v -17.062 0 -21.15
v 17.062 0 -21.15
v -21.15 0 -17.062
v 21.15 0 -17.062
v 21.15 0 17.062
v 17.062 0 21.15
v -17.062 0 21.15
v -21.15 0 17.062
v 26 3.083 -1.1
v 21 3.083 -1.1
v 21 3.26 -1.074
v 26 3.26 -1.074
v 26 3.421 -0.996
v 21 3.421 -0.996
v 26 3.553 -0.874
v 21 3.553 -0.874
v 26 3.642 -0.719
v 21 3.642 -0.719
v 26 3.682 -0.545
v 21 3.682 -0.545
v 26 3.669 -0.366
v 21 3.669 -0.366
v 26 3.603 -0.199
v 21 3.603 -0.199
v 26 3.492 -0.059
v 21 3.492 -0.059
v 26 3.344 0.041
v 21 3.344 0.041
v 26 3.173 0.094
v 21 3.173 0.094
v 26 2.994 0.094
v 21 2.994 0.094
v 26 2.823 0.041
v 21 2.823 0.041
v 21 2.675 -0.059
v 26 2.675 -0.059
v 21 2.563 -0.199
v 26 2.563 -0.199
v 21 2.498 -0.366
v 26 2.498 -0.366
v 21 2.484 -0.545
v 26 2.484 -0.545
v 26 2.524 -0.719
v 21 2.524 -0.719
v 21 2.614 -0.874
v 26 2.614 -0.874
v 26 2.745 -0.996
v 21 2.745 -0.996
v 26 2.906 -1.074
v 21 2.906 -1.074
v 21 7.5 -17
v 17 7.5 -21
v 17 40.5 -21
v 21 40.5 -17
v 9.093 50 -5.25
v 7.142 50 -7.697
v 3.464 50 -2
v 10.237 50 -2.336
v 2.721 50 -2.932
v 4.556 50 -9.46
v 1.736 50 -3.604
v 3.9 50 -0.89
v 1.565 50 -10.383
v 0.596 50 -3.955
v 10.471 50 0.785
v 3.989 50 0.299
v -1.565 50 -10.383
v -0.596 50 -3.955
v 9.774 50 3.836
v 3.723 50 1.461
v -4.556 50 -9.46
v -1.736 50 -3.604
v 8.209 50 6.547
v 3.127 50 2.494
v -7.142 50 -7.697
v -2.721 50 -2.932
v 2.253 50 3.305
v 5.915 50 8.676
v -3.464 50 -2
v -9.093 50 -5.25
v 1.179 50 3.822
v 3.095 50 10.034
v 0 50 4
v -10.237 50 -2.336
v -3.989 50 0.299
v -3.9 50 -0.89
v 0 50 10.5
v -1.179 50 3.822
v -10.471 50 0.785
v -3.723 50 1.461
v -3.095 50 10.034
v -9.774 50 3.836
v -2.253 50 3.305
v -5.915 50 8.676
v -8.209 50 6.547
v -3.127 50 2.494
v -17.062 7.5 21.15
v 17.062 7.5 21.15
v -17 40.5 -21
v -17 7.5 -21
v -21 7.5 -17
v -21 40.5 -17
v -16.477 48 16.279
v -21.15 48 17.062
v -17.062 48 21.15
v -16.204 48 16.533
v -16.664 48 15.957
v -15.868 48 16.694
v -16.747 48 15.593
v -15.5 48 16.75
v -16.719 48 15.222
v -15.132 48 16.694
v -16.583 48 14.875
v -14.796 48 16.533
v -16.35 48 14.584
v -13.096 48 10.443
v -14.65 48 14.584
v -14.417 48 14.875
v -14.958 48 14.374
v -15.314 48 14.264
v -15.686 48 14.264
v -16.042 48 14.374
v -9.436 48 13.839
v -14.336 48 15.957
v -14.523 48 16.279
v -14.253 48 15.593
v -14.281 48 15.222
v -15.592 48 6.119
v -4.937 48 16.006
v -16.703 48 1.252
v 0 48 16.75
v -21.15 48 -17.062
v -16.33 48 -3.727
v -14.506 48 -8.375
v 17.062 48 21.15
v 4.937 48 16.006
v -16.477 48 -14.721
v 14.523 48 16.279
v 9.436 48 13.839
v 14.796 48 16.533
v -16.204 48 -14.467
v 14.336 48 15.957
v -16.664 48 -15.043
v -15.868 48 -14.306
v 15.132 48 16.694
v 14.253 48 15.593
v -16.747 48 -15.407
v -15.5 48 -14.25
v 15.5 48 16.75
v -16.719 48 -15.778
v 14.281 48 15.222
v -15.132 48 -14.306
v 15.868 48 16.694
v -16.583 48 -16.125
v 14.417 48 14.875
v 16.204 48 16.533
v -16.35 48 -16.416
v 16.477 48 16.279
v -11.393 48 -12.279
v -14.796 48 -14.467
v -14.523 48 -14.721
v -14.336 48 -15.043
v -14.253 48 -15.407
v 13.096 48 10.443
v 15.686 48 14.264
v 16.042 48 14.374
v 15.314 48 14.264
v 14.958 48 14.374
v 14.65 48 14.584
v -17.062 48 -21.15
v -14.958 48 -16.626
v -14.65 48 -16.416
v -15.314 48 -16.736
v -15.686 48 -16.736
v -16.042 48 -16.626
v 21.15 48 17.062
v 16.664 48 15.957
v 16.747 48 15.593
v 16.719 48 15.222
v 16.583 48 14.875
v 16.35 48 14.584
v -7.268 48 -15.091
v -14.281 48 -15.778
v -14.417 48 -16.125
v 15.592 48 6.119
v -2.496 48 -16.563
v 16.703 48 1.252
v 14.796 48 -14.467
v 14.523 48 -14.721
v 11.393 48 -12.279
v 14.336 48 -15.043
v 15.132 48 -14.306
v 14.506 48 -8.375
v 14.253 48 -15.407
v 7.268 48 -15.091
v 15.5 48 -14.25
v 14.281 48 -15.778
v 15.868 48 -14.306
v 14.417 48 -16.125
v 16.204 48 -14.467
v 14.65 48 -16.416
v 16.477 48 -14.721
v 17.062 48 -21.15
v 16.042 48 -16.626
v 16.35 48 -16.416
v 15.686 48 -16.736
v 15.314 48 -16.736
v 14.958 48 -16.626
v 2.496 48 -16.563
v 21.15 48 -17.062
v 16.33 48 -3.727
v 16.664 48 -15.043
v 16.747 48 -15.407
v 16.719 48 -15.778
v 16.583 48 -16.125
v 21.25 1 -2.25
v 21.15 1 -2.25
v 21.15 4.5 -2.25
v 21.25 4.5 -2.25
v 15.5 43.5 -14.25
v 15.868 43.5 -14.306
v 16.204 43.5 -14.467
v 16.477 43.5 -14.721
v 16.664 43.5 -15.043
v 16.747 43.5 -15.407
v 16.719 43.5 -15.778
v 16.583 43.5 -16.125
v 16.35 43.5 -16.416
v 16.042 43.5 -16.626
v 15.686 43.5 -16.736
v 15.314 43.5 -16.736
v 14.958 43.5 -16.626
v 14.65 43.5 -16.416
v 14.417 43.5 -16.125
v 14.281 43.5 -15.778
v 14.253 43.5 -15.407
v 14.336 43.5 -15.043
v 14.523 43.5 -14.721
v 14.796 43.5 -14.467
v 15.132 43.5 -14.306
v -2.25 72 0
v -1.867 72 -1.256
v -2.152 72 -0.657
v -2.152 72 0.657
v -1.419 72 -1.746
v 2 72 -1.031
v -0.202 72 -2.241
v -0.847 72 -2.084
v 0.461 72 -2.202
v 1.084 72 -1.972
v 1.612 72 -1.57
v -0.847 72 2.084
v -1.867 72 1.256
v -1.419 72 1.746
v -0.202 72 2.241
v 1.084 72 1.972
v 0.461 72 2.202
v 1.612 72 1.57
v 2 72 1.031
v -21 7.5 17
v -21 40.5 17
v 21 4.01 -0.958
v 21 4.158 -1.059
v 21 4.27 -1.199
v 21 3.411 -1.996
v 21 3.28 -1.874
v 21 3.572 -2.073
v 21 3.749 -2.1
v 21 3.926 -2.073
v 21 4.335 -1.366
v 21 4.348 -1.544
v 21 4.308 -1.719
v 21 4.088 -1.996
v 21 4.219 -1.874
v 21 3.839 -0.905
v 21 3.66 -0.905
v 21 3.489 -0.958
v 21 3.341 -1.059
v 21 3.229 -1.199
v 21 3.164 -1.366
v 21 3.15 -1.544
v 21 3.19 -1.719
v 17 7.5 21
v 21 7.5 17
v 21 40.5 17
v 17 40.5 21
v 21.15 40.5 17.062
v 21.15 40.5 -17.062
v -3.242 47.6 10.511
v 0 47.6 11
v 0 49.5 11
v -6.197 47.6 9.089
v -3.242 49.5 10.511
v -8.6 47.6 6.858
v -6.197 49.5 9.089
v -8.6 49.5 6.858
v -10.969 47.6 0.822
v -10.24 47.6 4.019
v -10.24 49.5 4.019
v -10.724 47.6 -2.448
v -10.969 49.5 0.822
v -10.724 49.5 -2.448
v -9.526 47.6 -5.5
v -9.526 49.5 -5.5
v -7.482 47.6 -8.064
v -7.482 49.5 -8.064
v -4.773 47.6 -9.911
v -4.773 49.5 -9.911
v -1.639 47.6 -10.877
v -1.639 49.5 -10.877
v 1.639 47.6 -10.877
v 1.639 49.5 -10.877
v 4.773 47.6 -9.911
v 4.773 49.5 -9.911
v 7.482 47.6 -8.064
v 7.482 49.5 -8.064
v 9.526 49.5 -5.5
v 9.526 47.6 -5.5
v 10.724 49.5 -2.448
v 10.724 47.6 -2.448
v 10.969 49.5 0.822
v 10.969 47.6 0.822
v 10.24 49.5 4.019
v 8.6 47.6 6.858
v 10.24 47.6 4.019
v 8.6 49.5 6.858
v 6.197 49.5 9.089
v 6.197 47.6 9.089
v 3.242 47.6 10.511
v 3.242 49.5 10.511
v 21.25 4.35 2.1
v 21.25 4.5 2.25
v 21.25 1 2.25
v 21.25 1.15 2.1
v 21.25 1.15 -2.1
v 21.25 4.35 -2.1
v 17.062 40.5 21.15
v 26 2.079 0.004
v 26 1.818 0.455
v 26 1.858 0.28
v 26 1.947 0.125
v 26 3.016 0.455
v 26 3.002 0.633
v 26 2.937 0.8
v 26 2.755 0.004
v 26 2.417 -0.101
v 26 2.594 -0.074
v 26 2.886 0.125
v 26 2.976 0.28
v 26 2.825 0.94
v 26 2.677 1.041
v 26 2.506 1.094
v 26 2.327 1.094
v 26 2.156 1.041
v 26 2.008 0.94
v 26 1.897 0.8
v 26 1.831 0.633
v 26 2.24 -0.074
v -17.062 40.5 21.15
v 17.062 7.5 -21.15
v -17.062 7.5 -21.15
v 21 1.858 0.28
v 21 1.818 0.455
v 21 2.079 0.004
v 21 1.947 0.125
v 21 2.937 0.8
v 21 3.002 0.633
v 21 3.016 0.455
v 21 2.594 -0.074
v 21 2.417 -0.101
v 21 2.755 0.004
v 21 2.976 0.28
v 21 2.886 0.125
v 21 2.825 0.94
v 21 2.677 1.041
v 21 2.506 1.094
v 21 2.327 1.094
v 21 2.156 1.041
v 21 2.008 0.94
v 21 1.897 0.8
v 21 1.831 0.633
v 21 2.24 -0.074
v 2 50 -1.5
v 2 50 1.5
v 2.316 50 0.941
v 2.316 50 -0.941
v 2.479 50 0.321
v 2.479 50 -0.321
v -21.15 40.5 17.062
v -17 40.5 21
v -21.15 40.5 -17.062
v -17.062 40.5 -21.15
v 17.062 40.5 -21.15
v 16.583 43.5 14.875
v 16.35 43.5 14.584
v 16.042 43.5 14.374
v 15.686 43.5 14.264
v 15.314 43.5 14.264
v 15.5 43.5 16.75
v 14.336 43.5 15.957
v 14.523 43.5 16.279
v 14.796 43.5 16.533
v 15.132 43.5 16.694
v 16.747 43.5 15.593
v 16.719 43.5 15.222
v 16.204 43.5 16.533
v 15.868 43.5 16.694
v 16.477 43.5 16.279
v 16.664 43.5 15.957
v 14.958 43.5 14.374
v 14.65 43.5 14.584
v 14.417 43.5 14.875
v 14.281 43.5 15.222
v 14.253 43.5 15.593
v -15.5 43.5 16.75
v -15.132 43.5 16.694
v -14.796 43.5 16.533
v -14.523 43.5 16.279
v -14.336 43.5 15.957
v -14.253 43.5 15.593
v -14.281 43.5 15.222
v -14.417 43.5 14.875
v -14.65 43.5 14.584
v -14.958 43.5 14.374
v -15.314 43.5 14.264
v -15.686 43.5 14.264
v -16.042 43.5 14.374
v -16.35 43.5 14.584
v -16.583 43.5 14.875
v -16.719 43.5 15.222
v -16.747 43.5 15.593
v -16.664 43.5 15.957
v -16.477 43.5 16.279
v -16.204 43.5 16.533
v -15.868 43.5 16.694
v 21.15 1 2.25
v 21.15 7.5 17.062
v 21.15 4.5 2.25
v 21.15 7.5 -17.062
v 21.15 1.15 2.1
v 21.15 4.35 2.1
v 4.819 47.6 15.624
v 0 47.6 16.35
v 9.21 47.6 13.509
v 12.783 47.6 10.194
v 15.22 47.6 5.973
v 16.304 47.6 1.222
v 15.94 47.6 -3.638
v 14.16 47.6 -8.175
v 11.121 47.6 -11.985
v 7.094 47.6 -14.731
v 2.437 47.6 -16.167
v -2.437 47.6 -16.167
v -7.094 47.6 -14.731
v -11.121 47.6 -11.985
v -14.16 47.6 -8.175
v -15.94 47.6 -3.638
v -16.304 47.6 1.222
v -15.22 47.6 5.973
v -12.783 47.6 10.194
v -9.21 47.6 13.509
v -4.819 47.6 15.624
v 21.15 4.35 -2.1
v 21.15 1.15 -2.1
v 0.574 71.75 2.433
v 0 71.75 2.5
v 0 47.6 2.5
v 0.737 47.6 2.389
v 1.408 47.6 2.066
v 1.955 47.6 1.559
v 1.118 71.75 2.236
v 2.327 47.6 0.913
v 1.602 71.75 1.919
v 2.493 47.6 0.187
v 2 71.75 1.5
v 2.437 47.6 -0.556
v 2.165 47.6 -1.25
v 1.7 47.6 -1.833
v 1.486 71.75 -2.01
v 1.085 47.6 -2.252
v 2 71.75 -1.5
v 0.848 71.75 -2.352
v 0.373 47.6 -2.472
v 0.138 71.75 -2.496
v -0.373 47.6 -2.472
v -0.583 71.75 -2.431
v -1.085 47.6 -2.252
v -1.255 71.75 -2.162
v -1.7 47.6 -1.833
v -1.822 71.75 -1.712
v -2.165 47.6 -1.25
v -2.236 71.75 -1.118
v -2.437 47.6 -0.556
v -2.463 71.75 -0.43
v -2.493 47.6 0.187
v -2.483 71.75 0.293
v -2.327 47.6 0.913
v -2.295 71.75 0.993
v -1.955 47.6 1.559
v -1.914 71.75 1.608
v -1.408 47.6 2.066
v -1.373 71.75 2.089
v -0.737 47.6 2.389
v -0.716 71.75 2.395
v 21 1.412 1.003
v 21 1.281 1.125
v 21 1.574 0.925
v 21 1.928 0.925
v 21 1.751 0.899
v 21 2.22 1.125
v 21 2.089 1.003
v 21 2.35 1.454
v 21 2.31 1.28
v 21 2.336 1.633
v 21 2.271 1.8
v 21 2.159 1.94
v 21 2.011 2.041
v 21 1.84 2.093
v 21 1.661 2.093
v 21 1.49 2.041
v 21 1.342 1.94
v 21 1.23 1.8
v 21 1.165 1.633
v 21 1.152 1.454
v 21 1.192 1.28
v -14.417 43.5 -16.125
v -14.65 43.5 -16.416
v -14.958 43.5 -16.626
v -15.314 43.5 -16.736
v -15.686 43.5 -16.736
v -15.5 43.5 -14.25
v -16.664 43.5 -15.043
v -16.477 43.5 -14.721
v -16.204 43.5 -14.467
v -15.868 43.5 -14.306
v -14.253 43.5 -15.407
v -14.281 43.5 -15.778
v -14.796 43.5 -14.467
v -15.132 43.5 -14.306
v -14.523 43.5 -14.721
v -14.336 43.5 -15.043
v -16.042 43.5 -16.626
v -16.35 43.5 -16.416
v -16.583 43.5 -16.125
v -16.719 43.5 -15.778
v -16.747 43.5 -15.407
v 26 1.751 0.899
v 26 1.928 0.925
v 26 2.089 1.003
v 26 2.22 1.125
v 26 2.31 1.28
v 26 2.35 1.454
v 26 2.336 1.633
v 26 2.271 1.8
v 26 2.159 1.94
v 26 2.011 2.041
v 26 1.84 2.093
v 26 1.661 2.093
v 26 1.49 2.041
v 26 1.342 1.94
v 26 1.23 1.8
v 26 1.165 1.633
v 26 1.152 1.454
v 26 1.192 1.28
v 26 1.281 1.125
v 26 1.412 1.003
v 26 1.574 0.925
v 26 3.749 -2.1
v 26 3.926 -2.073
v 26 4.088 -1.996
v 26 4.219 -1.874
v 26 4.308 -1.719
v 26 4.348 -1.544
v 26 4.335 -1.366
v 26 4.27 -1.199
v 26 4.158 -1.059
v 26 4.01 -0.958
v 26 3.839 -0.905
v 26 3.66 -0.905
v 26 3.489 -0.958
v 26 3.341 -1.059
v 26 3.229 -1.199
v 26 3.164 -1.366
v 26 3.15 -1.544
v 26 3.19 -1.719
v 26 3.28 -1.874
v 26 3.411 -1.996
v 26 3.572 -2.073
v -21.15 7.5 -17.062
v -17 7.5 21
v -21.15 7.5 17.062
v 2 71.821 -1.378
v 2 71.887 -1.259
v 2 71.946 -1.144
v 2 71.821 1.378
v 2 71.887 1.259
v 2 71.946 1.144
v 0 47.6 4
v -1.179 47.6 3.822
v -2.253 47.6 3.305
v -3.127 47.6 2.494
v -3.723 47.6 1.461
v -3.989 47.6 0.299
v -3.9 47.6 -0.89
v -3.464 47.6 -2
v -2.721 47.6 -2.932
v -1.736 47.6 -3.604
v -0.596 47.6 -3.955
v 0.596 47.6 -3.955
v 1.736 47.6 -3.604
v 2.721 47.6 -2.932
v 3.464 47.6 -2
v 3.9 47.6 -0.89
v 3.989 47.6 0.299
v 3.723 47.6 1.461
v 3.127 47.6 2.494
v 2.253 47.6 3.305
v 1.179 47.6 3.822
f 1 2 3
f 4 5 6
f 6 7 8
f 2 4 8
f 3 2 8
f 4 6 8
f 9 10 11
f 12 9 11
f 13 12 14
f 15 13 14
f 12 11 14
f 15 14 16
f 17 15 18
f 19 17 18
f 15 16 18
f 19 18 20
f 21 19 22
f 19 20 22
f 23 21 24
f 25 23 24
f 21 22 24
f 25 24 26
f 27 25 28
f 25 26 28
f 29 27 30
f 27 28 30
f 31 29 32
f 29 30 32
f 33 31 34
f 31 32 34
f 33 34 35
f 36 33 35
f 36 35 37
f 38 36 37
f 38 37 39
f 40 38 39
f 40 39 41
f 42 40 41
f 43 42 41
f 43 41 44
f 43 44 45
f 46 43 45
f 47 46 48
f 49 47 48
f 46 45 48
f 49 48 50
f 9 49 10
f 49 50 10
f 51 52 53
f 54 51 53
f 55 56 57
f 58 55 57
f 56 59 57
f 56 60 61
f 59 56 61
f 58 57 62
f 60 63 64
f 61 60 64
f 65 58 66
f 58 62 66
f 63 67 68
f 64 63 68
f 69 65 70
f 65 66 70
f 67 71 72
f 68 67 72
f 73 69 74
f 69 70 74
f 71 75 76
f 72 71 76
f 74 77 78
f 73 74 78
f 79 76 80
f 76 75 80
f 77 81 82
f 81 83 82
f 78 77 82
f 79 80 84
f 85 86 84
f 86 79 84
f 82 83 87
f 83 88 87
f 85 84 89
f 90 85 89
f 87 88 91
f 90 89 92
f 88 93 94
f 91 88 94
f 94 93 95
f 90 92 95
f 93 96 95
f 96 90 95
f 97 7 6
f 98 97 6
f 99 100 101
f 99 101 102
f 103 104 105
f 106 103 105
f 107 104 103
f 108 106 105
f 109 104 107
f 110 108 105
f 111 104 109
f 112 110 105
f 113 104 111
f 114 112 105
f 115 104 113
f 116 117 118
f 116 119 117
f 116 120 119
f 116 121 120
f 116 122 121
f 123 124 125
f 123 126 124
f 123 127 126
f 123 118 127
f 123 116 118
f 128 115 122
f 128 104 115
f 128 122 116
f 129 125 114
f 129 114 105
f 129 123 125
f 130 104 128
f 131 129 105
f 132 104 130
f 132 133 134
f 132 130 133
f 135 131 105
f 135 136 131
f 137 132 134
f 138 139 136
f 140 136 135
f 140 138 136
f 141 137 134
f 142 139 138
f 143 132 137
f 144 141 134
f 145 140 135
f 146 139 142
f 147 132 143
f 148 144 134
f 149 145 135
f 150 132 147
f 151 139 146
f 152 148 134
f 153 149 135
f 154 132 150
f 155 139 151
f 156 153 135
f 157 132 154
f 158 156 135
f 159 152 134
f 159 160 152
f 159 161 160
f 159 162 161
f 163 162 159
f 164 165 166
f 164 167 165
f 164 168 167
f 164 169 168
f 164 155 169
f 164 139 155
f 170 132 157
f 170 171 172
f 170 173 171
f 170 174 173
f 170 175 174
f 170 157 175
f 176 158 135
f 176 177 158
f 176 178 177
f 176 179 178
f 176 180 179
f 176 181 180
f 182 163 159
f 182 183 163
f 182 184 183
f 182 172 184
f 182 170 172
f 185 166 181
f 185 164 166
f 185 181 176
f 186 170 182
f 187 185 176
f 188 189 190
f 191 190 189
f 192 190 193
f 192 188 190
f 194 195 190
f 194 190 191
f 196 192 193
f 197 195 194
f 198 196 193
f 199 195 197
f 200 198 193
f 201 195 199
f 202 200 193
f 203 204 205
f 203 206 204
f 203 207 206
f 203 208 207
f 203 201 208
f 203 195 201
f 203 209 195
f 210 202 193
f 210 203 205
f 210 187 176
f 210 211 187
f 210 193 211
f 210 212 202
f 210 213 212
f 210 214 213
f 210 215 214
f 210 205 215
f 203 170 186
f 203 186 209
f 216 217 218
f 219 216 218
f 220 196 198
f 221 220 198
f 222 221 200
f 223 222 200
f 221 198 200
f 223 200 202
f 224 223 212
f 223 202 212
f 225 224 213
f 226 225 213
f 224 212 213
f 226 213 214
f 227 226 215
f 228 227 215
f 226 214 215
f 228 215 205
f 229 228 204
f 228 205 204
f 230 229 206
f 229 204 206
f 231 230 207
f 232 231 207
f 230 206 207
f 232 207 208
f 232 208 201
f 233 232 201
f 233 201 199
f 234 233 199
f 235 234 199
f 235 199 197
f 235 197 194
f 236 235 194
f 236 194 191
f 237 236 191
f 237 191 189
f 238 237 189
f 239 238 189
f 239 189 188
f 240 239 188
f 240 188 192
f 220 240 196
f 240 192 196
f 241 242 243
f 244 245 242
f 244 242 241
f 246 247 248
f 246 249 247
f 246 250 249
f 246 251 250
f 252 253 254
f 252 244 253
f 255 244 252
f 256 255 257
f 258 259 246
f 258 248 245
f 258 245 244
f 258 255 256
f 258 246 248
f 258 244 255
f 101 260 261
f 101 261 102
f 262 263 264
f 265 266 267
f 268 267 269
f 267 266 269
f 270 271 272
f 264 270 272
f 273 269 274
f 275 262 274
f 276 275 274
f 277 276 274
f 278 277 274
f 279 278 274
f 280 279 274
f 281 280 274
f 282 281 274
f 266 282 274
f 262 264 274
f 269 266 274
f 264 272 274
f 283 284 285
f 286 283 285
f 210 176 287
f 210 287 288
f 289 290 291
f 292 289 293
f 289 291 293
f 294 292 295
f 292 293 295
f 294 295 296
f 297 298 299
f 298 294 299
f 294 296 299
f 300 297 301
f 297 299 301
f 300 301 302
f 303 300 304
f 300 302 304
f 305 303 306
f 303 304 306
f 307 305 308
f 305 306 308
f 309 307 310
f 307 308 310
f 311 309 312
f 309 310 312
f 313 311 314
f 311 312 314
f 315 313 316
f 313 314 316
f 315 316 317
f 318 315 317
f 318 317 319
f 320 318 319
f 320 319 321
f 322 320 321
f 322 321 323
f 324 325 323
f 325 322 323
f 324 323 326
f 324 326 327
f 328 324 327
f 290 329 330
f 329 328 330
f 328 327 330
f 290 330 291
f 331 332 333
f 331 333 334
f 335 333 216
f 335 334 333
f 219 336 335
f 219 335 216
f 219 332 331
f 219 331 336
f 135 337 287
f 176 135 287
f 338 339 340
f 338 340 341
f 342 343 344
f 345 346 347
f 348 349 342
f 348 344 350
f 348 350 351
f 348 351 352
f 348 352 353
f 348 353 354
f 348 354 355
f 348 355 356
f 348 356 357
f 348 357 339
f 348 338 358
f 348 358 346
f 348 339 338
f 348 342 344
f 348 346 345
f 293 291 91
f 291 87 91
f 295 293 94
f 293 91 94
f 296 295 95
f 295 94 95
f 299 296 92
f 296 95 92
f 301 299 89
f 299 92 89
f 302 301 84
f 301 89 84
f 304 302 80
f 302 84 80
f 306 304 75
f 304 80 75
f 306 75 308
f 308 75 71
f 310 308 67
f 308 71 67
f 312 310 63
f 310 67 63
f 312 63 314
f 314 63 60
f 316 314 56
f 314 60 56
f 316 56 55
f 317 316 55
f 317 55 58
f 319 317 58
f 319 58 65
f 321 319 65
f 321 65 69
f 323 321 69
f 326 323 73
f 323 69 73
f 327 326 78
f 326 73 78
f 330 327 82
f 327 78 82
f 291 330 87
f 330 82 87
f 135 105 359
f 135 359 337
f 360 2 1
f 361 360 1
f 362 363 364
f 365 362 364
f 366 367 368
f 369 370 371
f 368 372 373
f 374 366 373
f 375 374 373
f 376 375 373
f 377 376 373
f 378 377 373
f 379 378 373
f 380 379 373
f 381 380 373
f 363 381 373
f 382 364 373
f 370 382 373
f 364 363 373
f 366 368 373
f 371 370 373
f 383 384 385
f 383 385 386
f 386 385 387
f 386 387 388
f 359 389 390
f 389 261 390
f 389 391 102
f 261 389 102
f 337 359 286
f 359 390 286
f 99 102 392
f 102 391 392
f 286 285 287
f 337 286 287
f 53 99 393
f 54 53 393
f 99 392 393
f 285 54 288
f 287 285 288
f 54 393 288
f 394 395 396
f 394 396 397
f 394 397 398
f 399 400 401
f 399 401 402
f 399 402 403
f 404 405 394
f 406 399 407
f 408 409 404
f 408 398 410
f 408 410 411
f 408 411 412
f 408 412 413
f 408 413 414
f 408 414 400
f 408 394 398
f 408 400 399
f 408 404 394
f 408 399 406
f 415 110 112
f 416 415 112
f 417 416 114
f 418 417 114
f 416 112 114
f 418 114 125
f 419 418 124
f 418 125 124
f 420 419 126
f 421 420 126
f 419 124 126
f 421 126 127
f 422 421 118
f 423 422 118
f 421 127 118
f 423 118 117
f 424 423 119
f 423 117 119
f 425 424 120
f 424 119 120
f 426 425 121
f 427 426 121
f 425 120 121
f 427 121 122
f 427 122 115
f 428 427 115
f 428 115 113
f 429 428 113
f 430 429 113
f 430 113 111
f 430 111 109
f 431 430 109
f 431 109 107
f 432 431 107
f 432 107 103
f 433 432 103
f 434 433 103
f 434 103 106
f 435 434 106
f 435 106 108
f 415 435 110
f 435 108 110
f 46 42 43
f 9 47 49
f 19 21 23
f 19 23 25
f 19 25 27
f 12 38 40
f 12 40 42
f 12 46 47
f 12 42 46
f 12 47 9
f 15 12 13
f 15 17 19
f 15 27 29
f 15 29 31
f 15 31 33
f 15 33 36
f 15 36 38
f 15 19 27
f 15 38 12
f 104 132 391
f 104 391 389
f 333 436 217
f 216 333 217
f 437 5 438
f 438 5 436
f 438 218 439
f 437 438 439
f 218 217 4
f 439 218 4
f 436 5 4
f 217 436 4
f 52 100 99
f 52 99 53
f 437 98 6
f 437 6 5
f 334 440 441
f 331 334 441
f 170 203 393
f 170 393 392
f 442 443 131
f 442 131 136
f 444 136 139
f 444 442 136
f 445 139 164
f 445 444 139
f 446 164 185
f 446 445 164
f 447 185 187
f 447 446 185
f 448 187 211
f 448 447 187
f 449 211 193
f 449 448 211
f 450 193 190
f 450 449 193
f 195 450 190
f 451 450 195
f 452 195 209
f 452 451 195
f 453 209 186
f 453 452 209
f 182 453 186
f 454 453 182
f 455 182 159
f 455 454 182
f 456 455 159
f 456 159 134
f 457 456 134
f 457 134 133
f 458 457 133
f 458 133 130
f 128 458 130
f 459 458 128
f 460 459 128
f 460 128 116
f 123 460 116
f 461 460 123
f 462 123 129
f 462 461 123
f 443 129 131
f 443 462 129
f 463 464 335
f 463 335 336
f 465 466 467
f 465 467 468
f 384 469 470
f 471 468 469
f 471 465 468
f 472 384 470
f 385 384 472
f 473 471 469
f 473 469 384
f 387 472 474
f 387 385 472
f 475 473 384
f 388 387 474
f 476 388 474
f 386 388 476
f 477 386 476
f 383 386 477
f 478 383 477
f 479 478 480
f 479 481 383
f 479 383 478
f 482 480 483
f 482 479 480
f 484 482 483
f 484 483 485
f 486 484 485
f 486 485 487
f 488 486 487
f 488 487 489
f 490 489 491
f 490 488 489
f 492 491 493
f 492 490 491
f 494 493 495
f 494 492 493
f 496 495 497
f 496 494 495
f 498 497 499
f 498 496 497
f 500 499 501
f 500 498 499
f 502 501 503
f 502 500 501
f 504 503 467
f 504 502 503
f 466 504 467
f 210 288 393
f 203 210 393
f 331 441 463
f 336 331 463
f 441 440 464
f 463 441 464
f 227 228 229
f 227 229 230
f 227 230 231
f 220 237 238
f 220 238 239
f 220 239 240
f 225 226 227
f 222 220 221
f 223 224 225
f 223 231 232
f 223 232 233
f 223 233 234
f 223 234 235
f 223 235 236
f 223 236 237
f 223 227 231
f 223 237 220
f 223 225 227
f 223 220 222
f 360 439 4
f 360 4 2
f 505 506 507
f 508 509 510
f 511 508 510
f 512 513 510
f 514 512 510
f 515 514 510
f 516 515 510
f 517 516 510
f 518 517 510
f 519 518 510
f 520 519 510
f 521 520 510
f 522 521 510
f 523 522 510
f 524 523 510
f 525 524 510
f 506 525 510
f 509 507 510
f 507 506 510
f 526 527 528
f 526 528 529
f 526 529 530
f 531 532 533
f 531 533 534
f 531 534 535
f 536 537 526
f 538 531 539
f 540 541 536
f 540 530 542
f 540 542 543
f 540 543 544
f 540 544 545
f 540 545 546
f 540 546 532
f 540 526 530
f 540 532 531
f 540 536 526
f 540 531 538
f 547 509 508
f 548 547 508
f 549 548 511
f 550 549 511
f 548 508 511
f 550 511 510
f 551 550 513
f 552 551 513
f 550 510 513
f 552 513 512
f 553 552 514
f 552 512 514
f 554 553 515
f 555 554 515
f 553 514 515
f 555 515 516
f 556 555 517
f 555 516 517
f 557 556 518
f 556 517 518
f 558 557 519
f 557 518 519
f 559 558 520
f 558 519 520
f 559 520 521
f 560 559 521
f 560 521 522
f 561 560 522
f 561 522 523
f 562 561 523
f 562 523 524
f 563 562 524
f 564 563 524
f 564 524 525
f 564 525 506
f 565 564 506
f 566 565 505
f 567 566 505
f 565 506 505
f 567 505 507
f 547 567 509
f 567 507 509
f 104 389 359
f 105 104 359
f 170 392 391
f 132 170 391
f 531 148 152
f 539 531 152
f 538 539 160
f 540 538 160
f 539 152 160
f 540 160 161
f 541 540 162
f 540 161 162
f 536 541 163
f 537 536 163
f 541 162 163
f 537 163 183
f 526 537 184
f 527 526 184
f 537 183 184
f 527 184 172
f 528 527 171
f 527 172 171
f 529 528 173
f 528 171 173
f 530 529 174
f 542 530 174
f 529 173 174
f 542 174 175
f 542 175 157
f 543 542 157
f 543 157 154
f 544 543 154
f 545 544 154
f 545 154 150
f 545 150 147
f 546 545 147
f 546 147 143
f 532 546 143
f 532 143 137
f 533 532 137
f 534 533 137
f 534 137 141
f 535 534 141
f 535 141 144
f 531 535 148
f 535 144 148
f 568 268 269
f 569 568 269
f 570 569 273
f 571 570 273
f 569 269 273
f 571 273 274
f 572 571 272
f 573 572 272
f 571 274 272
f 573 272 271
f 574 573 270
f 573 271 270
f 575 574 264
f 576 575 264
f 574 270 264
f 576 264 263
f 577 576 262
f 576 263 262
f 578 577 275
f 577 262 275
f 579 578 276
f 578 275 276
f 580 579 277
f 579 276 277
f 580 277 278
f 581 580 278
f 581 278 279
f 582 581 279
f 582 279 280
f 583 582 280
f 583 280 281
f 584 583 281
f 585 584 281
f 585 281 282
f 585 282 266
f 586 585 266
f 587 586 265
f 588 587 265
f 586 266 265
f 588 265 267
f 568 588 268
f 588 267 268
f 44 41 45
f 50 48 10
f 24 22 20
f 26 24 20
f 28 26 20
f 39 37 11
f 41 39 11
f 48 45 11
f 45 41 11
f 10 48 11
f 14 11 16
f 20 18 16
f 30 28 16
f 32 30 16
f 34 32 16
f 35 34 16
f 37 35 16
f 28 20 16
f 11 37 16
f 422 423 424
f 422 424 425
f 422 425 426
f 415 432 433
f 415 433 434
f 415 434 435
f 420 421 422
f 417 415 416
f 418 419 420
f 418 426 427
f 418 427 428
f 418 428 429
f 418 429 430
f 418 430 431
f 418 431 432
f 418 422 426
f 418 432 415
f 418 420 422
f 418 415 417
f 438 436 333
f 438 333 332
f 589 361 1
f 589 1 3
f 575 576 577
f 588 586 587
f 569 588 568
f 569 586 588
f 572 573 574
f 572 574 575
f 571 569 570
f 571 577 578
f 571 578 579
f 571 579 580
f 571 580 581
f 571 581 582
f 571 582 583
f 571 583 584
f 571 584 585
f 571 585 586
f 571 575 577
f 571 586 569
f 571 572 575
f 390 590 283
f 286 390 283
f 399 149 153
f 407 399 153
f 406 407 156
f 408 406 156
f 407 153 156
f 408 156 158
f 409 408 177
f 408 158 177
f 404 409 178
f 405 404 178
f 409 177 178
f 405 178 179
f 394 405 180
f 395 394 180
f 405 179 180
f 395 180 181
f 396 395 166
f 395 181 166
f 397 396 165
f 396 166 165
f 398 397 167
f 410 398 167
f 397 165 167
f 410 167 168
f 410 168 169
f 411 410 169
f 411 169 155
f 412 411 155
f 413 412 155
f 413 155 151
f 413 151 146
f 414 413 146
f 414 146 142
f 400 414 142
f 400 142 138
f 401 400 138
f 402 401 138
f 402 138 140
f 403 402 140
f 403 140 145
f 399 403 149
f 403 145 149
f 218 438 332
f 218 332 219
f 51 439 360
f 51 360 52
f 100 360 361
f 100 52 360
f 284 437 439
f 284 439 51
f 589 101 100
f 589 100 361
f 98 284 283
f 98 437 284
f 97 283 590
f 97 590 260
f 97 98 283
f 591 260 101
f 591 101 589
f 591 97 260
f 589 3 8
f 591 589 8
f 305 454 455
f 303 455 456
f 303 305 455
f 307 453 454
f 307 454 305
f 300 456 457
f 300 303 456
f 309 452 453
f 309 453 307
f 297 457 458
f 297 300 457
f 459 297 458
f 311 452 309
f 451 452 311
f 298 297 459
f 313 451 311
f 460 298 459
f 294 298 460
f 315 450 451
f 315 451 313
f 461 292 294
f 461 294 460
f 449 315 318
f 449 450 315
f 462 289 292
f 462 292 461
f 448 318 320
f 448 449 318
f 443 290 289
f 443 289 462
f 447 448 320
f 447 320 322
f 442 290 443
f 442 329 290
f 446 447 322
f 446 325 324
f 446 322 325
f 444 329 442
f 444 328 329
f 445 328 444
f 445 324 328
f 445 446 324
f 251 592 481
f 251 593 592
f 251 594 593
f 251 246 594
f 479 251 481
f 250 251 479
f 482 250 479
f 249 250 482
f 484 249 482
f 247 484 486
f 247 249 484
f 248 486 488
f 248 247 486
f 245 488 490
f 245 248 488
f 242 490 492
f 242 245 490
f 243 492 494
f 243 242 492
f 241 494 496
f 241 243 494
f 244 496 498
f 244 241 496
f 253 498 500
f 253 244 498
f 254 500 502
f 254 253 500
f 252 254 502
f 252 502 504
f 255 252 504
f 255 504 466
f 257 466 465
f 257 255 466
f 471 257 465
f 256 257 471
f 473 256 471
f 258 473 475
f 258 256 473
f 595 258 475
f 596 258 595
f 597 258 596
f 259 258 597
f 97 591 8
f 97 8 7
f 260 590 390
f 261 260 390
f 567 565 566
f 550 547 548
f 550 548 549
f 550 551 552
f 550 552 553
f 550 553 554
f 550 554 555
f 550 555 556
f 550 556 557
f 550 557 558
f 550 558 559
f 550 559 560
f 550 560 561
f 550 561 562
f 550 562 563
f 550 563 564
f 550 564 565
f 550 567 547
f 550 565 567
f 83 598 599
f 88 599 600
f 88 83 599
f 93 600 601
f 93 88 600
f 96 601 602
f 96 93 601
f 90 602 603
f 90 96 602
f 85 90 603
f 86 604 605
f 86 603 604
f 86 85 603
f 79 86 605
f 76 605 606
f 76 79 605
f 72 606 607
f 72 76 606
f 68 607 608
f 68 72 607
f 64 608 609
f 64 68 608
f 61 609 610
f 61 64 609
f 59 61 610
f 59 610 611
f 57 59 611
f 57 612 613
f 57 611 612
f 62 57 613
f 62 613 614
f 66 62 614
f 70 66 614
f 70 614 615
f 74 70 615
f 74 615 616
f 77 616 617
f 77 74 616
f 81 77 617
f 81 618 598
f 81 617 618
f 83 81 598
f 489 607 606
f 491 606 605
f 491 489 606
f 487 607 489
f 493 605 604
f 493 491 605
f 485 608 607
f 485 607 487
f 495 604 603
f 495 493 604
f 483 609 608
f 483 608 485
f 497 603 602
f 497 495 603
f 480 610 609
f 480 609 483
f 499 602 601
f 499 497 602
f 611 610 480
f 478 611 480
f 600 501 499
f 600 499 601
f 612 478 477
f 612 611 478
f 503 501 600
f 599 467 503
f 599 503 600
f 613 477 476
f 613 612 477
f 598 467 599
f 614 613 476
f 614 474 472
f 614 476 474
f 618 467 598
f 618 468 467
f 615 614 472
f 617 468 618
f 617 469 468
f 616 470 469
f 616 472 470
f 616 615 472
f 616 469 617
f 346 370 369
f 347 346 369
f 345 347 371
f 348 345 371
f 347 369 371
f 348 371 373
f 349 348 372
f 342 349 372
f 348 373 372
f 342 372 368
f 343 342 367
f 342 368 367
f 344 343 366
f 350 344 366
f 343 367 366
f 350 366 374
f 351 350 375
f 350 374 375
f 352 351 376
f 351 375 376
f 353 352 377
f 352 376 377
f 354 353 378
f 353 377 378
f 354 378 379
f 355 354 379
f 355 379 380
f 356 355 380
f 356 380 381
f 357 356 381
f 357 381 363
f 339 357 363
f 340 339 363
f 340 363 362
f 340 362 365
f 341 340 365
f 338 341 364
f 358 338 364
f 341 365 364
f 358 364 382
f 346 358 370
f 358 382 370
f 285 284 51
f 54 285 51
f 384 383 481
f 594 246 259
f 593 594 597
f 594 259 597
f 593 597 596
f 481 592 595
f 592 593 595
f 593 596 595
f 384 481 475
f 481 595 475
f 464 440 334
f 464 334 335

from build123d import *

# Parameters (mm, degrees)
CROQUIS1_W                          = 42
CROQUIS1_H                          = 42
SALIENTE_EXTRUIR1_DEPTH             = 48
CHAFL_N1_SIZE                       = 4
CROQUIS3_R                          = 16.25
CORTAR_EXTRUIR1_DEPTH               = 0.4
SALIENTE_EXTRUIR2_REACH             = 60.155
CROQUIS4_R                          = 11
CROQUIS4_R_2                        = 4
CHAFL_N2_SIZE                       = 0.5
CROQUIS5_R                          = 2.5
SALIENTE_EXTRUIR3_DEPTH             = 22
SALIENTE_EXTRUIR3_DIRECTION_2_REACH = 60.155
CORTAR_EXTRUIR2_DEPTH               = 22
CHAFL_N3_SIZE                       = 0.25
SALIENTE_EXTRUIR9_DEPTH             = 7.5
SALIENTE_EXTRUIR10_DEPTH            = 7.5
CROQUIS7_R                          = 1.25
CORTAR_EXTRUIR3_DEPTH               = 4.5
CROQUIS10_W                         = 4.5
CROQUIS10_H                         = 3.5
CROQUIS10_W_2                       = 4.2
CROQUIS10_H_2                       = 3.2
SALIENTE_EXTRUIR7_DEPTH             = 0.1
CROQUIS11_R                         = 0.600632734
SALIENTE_EXTRUIR8_DEPTH             = 5
SALIENTE_EXTRUIR8_2_DEPTH           = 5
SALIENTE_EXTRUIR8_3_DEPTH           = 5
SALIENTE_EXTRUIR8_4_DEPTH           = 5


with BuildPart() as part:
    # Croquis1 → Saliente-Extruir1 (new body)
    with BuildSketch(Plane(origin=(0, 0, 0), x_dir=(1, 0, 0), z_dir=(0, 1, 0))):
        Rectangle(CROQUIS1_W, CROQUIS1_H)
    extrude(amount=SALIENTE_EXTRUIR1_DEPTH)

    # Chaflán1
    chafl_n1_edges = [part.edges().sort_by_distance(p)[0] for p in [
        (-21, 24, -21),
        (21, 24, -21),
        (21, 24, 21),
        (-21, 24, 21),
    ]]
    chamfer(chafl_n1_edges, length=CHAFL_N1_SIZE)

    # Croquis3 → Cortar-Extruir1 (cut)
    with BuildSketch(Plane(origin=(0, 48, 0), x_dir=(1, 0, 0), z_dir=(0, 1, 0))):
        with Locations(Location((0, 0, 0), (0, 0, 270))):
            Circle(CROQUIS3_R)
    extrude(amount=-CORTAR_EXTRUIR1_DEPTH, mode=Mode.SUBTRACT)

    # Croquis4 → Saliente-Extruir2 (add, up to next)
    with BuildSketch(Plane(origin=(0, 50, 0), x_dir=(-1, 0, 0), z_dir=(0, -1, 0)), mode=Mode.PRIVATE) as saliente_extruir2_sk1:
        with Locations(Location((0, 0, 0), (0, 0, 270))):
            Circle(CROQUIS4_R)
        with Locations(Location((0, 0, 0), (0, 0, 270))):
            Circle(CROQUIS4_R_2, mode=Mode.SUBTRACT)
    saliente_extruir2_tool1 = extrude(saliente_extruir2_sk1.sketch, amount=SALIENTE_EXTRUIR2_REACH, mode=Mode.PRIVATE) - part.part
    add(saliente_extruir2_tool1.solids().sort_by_distance((0, 50, -10.688873))[0])

    # Chaflán2
    # the kernel refuses this chamfer: 0.5 mm, written as the material it takes off along each edge
    with BuildSketch(Plane(origin=(0, 48, 0), x_dir=(0, 0, 1), z_dir=(-1, 0, 0))) as chafl_n2_piece_1_section:
        Polygon((16.25 + CHAFL_N2_SIZE, 0), (16.25, -CHAFL_N2_SIZE), (16.25, 0), align=None)
    chafl_n2_piece_1 = revolve(axis=Axis((0, 48, 0), (0, 1, 0)), mode=Mode.PRIVATE)
    chafl_n2_piece_1 = split(chafl_n2_piece_1, bisect_by=Plane(origin=(0, 47.6, -16.540253215), z_dir=(0, 1, 0)), keep=Keep.TOP, mode=Mode.PRIVATE)
    add(chafl_n2_piece_1, mode=Mode.SUBTRACT)
    with BuildSketch(Plane(origin=(0, 50, 0), x_dir=(0, 0, 1), z_dir=(1, 0, 0))) as chafl_n2_piece_2:
        Polygon((11, CHAFL_N2_SIZE), (11 - CHAFL_N2_SIZE, 0), (11, 0), align=None)
    revolve(axis=Axis((0, 50, 0), (0, -1, 0)), mode=Mode.SUBTRACT)


with BuildPart() as body_2:
    # Croquis5 → Saliente-Extruir3 (new body)
    with BuildSketch(Plane(origin=(0, 50, 0), x_dir=(1, 0, 0), z_dir=(0, 1, 0))):
        with Locations(Location((0, 0, 0), (0, 0, 270))):
            Circle(CROQUIS5_R)
    extrude(amount=SALIENTE_EXTRUIR3_DEPTH)


    # Croquis5 → Saliente-Extruir3 direction 2 (add, up to next)
    with BuildSketch(Plane(origin=(0, 50, 0), x_dir=(1, 0, 0), z_dir=(0, 1, 0)), mode=Mode.PRIVATE) as saliente_extruir3_direction_2_sk1:
        with Locations(Location((0, 0, 0), (0, 0, 270))):
            Circle(CROQUIS5_R)
    saliente_extruir3_direction_2_tool1 = extrude(saliente_extruir3_direction_2_sk1.sketch, amount=-SALIENTE_EXTRUIR3_DIRECTION_2_REACH, mode=Mode.PRIVATE) - part.part
    add(saliente_extruir3_direction_2_tool1.solids().sort_by_distance((0, 50, 0))[0])

    # Croquis6 → Cortar-Extruir2 (cut)
    with BuildSketch(Plane(origin=(0, 72, 0), x_dir=(1, 0, 0), z_dir=(0, 1, 0))):
        with BuildLine():
            Line((2, 1.5), (2, -1.5))
            ThreePointArc((2, -1.5), (2.5, 0), (2, 1.5))
        make_face()
    extrude(amount=-CORTAR_EXTRUIR2_DEPTH, mode=Mode.SUBTRACT)

    # Chaflán3
    chafl_n3_edges = [body_2.edges().sort_by_distance(p)[0] for p in [
        (-2.236067977, 72, -1.118033989),
    ]]
    chamfer(chafl_n3_edges, length=CHAFL_N3_SIZE)


    add(part.part)  # Saliente-Extruir9 merges part
    # Croquis12 → Saliente-Extruir9 (add)
    with BuildSketch(Plane(origin=(0, 48, 0), x_dir=(1, 0, 0), z_dir=(0, 1, 0))):
        Polygon((-17.062132034, 21.15), (-21.15, 17.062132034), (-21.15, -17.062132034), (-17.062132034, -21.15), (17.062132034, -21.15), (21.15, -17.062132034), (21.15, 17.062132034), (17.062132034, 21.15), align=None)
        Polygon((-17, 21), (-21, 17), (-21, -17), (-17, -21), (17, -21), (21, -17), (21, 17), (17, 21), align=None, mode=Mode.SUBTRACT)
    extrude(amount=-SALIENTE_EXTRUIR9_DEPTH)

    # Croquis13 → Saliente-Extruir10 (add)
    with BuildSketch(Plane.XZ):
        Polygon((-17.062132034, -21.15), (-21.15, -17.062132034), (-21.15, 17.062132034), (-17.062132034, 21.15), (17.062132034, 21.15), (21.15, 17.062132034), (21.15, -17.062132034), (17.062132034, -21.15), align=None)
        Polygon((-17, -21), (-21, -17), (-21, 17), (-17, 21), (17, 21), (21, 17), (21, -17), (17, -21), align=None, mode=Mode.SUBTRACT)
    extrude(amount=-SALIENTE_EXTRUIR10_DEPTH)

    # Croquis7 → Cortar-Extruir3 (cut)
    with BuildSketch(Plane(origin=(0, 48, 0), x_dir=(1, 0, 0), z_dir=(0, 1, 0))):
        with Locations(Location((-15.5, 15.5, 0), (0, 0, 270))):
            Circle(CROQUIS7_R)
        with Locations(Location((15.5, 15.5, 0), (0, 0, 270))):
            Circle(CROQUIS7_R)
        with Locations(Location((15.5, -15.5, 0), (0, 0, 270))):
            Circle(CROQUIS7_R)
        with Locations(Location((-15.5, -15.5, 0), (0, 0, 270))):
            Circle(CROQUIS7_R)
    extrude(amount=-CORTAR_EXTRUIR3_DEPTH, mode=Mode.SUBTRACT)

    # Croquis10 → Saliente-Extruir7 (add)
    with BuildSketch(Plane(origin=(21.15, 0, 0), x_dir=(0, 0, -1), z_dir=(1, 0, 0))):
        with Locations((0, 2.75)):
            Rectangle(CROQUIS10_W, CROQUIS10_H)
        with Locations((0, 2.75)):
            Rectangle(CROQUIS10_W_2, CROQUIS10_H_2, mode=Mode.SUBTRACT)
    extrude(amount=SALIENTE_EXTRUIR7_DEPTH)


with BuildPart() as body_2_2:
    # Croquis11 → Saliente-Extruir8 (new body)
    with BuildSketch(Plane(origin=(21, 0, 0), x_dir=(0, 0, -1), z_dir=(1, 0, 0))):
        with Locations((-1.499367266, 1.750632734)):
            Circle(CROQUIS11_R)
    extrude(amount=SALIENTE_EXTRUIR8_DEPTH)


with BuildPart() as body_3:
    # Croquis11 → Saliente-Extruir8 2 (new body)
    with BuildSketch(Plane(origin=(21, 0, 0), x_dir=(0, 0, -1), z_dir=(1, 0, 0))):
        with Locations((-0.499789089, 2.416877578)):
            Circle(CROQUIS11_R)
    extrude(amount=SALIENTE_EXTRUIR8_2_DEPTH)


with BuildPart() as body_4:
    # Croquis11 → Saliente-Extruir8 3 (new body)
    with BuildSketch(Plane(origin=(21, 0, 0), x_dir=(0, 0, -1), z_dir=(1, 0, 0))):
        with Locations((0.499789089, 3.083122422)):
            Circle(CROQUIS11_R)
    extrude(amount=SALIENTE_EXTRUIR8_3_DEPTH)


with BuildPart() as body_5:
    # Croquis11 → Saliente-Extruir8 4 (new body)
    with BuildSketch(Plane(origin=(21, 0, 0), x_dir=(0, 0, -1), z_dir=(1, 0, 0))):
        with Locations((1.499367266, 3.749367266)):
            Circle(CROQUIS11_R)
    extrude(amount=SALIENTE_EXTRUIR8_4_DEPTH)


solid = Compound([body_2.part, body_2_2.part, body_3.part, body_4.part, body_5.part])
